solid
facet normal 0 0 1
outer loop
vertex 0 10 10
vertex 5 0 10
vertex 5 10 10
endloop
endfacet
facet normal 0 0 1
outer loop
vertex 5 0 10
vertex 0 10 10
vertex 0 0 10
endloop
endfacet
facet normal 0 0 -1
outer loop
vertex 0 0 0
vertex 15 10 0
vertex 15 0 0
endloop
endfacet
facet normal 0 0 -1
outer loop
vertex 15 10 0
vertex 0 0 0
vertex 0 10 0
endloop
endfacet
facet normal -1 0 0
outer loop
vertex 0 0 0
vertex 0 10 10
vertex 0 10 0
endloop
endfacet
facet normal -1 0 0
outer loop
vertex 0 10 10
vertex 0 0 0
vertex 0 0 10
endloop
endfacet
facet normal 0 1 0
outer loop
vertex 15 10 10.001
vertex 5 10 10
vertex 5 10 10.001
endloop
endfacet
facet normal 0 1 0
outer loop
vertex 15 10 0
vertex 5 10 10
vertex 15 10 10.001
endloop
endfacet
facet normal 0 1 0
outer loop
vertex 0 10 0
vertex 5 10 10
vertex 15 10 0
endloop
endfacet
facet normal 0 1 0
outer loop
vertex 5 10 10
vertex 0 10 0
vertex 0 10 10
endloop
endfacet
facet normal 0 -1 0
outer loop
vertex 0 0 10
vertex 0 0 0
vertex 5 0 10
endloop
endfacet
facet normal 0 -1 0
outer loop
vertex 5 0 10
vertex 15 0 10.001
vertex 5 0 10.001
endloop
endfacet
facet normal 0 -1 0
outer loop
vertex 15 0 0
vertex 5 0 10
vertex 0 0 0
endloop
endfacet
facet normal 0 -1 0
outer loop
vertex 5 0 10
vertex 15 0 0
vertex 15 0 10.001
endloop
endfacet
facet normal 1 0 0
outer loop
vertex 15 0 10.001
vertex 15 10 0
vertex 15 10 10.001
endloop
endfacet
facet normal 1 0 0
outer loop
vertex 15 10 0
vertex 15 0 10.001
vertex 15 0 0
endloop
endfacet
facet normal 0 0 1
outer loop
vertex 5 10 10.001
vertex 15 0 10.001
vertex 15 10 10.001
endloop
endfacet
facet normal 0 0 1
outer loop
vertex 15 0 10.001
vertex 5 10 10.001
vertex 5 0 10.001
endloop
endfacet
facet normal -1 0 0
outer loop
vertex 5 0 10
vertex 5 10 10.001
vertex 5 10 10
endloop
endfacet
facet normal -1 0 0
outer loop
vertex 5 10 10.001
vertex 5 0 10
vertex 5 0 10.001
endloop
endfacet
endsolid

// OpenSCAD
color("red") cube(10);
color("blue") translate([5,0,0]) cube([10, 10, 10.001]);
